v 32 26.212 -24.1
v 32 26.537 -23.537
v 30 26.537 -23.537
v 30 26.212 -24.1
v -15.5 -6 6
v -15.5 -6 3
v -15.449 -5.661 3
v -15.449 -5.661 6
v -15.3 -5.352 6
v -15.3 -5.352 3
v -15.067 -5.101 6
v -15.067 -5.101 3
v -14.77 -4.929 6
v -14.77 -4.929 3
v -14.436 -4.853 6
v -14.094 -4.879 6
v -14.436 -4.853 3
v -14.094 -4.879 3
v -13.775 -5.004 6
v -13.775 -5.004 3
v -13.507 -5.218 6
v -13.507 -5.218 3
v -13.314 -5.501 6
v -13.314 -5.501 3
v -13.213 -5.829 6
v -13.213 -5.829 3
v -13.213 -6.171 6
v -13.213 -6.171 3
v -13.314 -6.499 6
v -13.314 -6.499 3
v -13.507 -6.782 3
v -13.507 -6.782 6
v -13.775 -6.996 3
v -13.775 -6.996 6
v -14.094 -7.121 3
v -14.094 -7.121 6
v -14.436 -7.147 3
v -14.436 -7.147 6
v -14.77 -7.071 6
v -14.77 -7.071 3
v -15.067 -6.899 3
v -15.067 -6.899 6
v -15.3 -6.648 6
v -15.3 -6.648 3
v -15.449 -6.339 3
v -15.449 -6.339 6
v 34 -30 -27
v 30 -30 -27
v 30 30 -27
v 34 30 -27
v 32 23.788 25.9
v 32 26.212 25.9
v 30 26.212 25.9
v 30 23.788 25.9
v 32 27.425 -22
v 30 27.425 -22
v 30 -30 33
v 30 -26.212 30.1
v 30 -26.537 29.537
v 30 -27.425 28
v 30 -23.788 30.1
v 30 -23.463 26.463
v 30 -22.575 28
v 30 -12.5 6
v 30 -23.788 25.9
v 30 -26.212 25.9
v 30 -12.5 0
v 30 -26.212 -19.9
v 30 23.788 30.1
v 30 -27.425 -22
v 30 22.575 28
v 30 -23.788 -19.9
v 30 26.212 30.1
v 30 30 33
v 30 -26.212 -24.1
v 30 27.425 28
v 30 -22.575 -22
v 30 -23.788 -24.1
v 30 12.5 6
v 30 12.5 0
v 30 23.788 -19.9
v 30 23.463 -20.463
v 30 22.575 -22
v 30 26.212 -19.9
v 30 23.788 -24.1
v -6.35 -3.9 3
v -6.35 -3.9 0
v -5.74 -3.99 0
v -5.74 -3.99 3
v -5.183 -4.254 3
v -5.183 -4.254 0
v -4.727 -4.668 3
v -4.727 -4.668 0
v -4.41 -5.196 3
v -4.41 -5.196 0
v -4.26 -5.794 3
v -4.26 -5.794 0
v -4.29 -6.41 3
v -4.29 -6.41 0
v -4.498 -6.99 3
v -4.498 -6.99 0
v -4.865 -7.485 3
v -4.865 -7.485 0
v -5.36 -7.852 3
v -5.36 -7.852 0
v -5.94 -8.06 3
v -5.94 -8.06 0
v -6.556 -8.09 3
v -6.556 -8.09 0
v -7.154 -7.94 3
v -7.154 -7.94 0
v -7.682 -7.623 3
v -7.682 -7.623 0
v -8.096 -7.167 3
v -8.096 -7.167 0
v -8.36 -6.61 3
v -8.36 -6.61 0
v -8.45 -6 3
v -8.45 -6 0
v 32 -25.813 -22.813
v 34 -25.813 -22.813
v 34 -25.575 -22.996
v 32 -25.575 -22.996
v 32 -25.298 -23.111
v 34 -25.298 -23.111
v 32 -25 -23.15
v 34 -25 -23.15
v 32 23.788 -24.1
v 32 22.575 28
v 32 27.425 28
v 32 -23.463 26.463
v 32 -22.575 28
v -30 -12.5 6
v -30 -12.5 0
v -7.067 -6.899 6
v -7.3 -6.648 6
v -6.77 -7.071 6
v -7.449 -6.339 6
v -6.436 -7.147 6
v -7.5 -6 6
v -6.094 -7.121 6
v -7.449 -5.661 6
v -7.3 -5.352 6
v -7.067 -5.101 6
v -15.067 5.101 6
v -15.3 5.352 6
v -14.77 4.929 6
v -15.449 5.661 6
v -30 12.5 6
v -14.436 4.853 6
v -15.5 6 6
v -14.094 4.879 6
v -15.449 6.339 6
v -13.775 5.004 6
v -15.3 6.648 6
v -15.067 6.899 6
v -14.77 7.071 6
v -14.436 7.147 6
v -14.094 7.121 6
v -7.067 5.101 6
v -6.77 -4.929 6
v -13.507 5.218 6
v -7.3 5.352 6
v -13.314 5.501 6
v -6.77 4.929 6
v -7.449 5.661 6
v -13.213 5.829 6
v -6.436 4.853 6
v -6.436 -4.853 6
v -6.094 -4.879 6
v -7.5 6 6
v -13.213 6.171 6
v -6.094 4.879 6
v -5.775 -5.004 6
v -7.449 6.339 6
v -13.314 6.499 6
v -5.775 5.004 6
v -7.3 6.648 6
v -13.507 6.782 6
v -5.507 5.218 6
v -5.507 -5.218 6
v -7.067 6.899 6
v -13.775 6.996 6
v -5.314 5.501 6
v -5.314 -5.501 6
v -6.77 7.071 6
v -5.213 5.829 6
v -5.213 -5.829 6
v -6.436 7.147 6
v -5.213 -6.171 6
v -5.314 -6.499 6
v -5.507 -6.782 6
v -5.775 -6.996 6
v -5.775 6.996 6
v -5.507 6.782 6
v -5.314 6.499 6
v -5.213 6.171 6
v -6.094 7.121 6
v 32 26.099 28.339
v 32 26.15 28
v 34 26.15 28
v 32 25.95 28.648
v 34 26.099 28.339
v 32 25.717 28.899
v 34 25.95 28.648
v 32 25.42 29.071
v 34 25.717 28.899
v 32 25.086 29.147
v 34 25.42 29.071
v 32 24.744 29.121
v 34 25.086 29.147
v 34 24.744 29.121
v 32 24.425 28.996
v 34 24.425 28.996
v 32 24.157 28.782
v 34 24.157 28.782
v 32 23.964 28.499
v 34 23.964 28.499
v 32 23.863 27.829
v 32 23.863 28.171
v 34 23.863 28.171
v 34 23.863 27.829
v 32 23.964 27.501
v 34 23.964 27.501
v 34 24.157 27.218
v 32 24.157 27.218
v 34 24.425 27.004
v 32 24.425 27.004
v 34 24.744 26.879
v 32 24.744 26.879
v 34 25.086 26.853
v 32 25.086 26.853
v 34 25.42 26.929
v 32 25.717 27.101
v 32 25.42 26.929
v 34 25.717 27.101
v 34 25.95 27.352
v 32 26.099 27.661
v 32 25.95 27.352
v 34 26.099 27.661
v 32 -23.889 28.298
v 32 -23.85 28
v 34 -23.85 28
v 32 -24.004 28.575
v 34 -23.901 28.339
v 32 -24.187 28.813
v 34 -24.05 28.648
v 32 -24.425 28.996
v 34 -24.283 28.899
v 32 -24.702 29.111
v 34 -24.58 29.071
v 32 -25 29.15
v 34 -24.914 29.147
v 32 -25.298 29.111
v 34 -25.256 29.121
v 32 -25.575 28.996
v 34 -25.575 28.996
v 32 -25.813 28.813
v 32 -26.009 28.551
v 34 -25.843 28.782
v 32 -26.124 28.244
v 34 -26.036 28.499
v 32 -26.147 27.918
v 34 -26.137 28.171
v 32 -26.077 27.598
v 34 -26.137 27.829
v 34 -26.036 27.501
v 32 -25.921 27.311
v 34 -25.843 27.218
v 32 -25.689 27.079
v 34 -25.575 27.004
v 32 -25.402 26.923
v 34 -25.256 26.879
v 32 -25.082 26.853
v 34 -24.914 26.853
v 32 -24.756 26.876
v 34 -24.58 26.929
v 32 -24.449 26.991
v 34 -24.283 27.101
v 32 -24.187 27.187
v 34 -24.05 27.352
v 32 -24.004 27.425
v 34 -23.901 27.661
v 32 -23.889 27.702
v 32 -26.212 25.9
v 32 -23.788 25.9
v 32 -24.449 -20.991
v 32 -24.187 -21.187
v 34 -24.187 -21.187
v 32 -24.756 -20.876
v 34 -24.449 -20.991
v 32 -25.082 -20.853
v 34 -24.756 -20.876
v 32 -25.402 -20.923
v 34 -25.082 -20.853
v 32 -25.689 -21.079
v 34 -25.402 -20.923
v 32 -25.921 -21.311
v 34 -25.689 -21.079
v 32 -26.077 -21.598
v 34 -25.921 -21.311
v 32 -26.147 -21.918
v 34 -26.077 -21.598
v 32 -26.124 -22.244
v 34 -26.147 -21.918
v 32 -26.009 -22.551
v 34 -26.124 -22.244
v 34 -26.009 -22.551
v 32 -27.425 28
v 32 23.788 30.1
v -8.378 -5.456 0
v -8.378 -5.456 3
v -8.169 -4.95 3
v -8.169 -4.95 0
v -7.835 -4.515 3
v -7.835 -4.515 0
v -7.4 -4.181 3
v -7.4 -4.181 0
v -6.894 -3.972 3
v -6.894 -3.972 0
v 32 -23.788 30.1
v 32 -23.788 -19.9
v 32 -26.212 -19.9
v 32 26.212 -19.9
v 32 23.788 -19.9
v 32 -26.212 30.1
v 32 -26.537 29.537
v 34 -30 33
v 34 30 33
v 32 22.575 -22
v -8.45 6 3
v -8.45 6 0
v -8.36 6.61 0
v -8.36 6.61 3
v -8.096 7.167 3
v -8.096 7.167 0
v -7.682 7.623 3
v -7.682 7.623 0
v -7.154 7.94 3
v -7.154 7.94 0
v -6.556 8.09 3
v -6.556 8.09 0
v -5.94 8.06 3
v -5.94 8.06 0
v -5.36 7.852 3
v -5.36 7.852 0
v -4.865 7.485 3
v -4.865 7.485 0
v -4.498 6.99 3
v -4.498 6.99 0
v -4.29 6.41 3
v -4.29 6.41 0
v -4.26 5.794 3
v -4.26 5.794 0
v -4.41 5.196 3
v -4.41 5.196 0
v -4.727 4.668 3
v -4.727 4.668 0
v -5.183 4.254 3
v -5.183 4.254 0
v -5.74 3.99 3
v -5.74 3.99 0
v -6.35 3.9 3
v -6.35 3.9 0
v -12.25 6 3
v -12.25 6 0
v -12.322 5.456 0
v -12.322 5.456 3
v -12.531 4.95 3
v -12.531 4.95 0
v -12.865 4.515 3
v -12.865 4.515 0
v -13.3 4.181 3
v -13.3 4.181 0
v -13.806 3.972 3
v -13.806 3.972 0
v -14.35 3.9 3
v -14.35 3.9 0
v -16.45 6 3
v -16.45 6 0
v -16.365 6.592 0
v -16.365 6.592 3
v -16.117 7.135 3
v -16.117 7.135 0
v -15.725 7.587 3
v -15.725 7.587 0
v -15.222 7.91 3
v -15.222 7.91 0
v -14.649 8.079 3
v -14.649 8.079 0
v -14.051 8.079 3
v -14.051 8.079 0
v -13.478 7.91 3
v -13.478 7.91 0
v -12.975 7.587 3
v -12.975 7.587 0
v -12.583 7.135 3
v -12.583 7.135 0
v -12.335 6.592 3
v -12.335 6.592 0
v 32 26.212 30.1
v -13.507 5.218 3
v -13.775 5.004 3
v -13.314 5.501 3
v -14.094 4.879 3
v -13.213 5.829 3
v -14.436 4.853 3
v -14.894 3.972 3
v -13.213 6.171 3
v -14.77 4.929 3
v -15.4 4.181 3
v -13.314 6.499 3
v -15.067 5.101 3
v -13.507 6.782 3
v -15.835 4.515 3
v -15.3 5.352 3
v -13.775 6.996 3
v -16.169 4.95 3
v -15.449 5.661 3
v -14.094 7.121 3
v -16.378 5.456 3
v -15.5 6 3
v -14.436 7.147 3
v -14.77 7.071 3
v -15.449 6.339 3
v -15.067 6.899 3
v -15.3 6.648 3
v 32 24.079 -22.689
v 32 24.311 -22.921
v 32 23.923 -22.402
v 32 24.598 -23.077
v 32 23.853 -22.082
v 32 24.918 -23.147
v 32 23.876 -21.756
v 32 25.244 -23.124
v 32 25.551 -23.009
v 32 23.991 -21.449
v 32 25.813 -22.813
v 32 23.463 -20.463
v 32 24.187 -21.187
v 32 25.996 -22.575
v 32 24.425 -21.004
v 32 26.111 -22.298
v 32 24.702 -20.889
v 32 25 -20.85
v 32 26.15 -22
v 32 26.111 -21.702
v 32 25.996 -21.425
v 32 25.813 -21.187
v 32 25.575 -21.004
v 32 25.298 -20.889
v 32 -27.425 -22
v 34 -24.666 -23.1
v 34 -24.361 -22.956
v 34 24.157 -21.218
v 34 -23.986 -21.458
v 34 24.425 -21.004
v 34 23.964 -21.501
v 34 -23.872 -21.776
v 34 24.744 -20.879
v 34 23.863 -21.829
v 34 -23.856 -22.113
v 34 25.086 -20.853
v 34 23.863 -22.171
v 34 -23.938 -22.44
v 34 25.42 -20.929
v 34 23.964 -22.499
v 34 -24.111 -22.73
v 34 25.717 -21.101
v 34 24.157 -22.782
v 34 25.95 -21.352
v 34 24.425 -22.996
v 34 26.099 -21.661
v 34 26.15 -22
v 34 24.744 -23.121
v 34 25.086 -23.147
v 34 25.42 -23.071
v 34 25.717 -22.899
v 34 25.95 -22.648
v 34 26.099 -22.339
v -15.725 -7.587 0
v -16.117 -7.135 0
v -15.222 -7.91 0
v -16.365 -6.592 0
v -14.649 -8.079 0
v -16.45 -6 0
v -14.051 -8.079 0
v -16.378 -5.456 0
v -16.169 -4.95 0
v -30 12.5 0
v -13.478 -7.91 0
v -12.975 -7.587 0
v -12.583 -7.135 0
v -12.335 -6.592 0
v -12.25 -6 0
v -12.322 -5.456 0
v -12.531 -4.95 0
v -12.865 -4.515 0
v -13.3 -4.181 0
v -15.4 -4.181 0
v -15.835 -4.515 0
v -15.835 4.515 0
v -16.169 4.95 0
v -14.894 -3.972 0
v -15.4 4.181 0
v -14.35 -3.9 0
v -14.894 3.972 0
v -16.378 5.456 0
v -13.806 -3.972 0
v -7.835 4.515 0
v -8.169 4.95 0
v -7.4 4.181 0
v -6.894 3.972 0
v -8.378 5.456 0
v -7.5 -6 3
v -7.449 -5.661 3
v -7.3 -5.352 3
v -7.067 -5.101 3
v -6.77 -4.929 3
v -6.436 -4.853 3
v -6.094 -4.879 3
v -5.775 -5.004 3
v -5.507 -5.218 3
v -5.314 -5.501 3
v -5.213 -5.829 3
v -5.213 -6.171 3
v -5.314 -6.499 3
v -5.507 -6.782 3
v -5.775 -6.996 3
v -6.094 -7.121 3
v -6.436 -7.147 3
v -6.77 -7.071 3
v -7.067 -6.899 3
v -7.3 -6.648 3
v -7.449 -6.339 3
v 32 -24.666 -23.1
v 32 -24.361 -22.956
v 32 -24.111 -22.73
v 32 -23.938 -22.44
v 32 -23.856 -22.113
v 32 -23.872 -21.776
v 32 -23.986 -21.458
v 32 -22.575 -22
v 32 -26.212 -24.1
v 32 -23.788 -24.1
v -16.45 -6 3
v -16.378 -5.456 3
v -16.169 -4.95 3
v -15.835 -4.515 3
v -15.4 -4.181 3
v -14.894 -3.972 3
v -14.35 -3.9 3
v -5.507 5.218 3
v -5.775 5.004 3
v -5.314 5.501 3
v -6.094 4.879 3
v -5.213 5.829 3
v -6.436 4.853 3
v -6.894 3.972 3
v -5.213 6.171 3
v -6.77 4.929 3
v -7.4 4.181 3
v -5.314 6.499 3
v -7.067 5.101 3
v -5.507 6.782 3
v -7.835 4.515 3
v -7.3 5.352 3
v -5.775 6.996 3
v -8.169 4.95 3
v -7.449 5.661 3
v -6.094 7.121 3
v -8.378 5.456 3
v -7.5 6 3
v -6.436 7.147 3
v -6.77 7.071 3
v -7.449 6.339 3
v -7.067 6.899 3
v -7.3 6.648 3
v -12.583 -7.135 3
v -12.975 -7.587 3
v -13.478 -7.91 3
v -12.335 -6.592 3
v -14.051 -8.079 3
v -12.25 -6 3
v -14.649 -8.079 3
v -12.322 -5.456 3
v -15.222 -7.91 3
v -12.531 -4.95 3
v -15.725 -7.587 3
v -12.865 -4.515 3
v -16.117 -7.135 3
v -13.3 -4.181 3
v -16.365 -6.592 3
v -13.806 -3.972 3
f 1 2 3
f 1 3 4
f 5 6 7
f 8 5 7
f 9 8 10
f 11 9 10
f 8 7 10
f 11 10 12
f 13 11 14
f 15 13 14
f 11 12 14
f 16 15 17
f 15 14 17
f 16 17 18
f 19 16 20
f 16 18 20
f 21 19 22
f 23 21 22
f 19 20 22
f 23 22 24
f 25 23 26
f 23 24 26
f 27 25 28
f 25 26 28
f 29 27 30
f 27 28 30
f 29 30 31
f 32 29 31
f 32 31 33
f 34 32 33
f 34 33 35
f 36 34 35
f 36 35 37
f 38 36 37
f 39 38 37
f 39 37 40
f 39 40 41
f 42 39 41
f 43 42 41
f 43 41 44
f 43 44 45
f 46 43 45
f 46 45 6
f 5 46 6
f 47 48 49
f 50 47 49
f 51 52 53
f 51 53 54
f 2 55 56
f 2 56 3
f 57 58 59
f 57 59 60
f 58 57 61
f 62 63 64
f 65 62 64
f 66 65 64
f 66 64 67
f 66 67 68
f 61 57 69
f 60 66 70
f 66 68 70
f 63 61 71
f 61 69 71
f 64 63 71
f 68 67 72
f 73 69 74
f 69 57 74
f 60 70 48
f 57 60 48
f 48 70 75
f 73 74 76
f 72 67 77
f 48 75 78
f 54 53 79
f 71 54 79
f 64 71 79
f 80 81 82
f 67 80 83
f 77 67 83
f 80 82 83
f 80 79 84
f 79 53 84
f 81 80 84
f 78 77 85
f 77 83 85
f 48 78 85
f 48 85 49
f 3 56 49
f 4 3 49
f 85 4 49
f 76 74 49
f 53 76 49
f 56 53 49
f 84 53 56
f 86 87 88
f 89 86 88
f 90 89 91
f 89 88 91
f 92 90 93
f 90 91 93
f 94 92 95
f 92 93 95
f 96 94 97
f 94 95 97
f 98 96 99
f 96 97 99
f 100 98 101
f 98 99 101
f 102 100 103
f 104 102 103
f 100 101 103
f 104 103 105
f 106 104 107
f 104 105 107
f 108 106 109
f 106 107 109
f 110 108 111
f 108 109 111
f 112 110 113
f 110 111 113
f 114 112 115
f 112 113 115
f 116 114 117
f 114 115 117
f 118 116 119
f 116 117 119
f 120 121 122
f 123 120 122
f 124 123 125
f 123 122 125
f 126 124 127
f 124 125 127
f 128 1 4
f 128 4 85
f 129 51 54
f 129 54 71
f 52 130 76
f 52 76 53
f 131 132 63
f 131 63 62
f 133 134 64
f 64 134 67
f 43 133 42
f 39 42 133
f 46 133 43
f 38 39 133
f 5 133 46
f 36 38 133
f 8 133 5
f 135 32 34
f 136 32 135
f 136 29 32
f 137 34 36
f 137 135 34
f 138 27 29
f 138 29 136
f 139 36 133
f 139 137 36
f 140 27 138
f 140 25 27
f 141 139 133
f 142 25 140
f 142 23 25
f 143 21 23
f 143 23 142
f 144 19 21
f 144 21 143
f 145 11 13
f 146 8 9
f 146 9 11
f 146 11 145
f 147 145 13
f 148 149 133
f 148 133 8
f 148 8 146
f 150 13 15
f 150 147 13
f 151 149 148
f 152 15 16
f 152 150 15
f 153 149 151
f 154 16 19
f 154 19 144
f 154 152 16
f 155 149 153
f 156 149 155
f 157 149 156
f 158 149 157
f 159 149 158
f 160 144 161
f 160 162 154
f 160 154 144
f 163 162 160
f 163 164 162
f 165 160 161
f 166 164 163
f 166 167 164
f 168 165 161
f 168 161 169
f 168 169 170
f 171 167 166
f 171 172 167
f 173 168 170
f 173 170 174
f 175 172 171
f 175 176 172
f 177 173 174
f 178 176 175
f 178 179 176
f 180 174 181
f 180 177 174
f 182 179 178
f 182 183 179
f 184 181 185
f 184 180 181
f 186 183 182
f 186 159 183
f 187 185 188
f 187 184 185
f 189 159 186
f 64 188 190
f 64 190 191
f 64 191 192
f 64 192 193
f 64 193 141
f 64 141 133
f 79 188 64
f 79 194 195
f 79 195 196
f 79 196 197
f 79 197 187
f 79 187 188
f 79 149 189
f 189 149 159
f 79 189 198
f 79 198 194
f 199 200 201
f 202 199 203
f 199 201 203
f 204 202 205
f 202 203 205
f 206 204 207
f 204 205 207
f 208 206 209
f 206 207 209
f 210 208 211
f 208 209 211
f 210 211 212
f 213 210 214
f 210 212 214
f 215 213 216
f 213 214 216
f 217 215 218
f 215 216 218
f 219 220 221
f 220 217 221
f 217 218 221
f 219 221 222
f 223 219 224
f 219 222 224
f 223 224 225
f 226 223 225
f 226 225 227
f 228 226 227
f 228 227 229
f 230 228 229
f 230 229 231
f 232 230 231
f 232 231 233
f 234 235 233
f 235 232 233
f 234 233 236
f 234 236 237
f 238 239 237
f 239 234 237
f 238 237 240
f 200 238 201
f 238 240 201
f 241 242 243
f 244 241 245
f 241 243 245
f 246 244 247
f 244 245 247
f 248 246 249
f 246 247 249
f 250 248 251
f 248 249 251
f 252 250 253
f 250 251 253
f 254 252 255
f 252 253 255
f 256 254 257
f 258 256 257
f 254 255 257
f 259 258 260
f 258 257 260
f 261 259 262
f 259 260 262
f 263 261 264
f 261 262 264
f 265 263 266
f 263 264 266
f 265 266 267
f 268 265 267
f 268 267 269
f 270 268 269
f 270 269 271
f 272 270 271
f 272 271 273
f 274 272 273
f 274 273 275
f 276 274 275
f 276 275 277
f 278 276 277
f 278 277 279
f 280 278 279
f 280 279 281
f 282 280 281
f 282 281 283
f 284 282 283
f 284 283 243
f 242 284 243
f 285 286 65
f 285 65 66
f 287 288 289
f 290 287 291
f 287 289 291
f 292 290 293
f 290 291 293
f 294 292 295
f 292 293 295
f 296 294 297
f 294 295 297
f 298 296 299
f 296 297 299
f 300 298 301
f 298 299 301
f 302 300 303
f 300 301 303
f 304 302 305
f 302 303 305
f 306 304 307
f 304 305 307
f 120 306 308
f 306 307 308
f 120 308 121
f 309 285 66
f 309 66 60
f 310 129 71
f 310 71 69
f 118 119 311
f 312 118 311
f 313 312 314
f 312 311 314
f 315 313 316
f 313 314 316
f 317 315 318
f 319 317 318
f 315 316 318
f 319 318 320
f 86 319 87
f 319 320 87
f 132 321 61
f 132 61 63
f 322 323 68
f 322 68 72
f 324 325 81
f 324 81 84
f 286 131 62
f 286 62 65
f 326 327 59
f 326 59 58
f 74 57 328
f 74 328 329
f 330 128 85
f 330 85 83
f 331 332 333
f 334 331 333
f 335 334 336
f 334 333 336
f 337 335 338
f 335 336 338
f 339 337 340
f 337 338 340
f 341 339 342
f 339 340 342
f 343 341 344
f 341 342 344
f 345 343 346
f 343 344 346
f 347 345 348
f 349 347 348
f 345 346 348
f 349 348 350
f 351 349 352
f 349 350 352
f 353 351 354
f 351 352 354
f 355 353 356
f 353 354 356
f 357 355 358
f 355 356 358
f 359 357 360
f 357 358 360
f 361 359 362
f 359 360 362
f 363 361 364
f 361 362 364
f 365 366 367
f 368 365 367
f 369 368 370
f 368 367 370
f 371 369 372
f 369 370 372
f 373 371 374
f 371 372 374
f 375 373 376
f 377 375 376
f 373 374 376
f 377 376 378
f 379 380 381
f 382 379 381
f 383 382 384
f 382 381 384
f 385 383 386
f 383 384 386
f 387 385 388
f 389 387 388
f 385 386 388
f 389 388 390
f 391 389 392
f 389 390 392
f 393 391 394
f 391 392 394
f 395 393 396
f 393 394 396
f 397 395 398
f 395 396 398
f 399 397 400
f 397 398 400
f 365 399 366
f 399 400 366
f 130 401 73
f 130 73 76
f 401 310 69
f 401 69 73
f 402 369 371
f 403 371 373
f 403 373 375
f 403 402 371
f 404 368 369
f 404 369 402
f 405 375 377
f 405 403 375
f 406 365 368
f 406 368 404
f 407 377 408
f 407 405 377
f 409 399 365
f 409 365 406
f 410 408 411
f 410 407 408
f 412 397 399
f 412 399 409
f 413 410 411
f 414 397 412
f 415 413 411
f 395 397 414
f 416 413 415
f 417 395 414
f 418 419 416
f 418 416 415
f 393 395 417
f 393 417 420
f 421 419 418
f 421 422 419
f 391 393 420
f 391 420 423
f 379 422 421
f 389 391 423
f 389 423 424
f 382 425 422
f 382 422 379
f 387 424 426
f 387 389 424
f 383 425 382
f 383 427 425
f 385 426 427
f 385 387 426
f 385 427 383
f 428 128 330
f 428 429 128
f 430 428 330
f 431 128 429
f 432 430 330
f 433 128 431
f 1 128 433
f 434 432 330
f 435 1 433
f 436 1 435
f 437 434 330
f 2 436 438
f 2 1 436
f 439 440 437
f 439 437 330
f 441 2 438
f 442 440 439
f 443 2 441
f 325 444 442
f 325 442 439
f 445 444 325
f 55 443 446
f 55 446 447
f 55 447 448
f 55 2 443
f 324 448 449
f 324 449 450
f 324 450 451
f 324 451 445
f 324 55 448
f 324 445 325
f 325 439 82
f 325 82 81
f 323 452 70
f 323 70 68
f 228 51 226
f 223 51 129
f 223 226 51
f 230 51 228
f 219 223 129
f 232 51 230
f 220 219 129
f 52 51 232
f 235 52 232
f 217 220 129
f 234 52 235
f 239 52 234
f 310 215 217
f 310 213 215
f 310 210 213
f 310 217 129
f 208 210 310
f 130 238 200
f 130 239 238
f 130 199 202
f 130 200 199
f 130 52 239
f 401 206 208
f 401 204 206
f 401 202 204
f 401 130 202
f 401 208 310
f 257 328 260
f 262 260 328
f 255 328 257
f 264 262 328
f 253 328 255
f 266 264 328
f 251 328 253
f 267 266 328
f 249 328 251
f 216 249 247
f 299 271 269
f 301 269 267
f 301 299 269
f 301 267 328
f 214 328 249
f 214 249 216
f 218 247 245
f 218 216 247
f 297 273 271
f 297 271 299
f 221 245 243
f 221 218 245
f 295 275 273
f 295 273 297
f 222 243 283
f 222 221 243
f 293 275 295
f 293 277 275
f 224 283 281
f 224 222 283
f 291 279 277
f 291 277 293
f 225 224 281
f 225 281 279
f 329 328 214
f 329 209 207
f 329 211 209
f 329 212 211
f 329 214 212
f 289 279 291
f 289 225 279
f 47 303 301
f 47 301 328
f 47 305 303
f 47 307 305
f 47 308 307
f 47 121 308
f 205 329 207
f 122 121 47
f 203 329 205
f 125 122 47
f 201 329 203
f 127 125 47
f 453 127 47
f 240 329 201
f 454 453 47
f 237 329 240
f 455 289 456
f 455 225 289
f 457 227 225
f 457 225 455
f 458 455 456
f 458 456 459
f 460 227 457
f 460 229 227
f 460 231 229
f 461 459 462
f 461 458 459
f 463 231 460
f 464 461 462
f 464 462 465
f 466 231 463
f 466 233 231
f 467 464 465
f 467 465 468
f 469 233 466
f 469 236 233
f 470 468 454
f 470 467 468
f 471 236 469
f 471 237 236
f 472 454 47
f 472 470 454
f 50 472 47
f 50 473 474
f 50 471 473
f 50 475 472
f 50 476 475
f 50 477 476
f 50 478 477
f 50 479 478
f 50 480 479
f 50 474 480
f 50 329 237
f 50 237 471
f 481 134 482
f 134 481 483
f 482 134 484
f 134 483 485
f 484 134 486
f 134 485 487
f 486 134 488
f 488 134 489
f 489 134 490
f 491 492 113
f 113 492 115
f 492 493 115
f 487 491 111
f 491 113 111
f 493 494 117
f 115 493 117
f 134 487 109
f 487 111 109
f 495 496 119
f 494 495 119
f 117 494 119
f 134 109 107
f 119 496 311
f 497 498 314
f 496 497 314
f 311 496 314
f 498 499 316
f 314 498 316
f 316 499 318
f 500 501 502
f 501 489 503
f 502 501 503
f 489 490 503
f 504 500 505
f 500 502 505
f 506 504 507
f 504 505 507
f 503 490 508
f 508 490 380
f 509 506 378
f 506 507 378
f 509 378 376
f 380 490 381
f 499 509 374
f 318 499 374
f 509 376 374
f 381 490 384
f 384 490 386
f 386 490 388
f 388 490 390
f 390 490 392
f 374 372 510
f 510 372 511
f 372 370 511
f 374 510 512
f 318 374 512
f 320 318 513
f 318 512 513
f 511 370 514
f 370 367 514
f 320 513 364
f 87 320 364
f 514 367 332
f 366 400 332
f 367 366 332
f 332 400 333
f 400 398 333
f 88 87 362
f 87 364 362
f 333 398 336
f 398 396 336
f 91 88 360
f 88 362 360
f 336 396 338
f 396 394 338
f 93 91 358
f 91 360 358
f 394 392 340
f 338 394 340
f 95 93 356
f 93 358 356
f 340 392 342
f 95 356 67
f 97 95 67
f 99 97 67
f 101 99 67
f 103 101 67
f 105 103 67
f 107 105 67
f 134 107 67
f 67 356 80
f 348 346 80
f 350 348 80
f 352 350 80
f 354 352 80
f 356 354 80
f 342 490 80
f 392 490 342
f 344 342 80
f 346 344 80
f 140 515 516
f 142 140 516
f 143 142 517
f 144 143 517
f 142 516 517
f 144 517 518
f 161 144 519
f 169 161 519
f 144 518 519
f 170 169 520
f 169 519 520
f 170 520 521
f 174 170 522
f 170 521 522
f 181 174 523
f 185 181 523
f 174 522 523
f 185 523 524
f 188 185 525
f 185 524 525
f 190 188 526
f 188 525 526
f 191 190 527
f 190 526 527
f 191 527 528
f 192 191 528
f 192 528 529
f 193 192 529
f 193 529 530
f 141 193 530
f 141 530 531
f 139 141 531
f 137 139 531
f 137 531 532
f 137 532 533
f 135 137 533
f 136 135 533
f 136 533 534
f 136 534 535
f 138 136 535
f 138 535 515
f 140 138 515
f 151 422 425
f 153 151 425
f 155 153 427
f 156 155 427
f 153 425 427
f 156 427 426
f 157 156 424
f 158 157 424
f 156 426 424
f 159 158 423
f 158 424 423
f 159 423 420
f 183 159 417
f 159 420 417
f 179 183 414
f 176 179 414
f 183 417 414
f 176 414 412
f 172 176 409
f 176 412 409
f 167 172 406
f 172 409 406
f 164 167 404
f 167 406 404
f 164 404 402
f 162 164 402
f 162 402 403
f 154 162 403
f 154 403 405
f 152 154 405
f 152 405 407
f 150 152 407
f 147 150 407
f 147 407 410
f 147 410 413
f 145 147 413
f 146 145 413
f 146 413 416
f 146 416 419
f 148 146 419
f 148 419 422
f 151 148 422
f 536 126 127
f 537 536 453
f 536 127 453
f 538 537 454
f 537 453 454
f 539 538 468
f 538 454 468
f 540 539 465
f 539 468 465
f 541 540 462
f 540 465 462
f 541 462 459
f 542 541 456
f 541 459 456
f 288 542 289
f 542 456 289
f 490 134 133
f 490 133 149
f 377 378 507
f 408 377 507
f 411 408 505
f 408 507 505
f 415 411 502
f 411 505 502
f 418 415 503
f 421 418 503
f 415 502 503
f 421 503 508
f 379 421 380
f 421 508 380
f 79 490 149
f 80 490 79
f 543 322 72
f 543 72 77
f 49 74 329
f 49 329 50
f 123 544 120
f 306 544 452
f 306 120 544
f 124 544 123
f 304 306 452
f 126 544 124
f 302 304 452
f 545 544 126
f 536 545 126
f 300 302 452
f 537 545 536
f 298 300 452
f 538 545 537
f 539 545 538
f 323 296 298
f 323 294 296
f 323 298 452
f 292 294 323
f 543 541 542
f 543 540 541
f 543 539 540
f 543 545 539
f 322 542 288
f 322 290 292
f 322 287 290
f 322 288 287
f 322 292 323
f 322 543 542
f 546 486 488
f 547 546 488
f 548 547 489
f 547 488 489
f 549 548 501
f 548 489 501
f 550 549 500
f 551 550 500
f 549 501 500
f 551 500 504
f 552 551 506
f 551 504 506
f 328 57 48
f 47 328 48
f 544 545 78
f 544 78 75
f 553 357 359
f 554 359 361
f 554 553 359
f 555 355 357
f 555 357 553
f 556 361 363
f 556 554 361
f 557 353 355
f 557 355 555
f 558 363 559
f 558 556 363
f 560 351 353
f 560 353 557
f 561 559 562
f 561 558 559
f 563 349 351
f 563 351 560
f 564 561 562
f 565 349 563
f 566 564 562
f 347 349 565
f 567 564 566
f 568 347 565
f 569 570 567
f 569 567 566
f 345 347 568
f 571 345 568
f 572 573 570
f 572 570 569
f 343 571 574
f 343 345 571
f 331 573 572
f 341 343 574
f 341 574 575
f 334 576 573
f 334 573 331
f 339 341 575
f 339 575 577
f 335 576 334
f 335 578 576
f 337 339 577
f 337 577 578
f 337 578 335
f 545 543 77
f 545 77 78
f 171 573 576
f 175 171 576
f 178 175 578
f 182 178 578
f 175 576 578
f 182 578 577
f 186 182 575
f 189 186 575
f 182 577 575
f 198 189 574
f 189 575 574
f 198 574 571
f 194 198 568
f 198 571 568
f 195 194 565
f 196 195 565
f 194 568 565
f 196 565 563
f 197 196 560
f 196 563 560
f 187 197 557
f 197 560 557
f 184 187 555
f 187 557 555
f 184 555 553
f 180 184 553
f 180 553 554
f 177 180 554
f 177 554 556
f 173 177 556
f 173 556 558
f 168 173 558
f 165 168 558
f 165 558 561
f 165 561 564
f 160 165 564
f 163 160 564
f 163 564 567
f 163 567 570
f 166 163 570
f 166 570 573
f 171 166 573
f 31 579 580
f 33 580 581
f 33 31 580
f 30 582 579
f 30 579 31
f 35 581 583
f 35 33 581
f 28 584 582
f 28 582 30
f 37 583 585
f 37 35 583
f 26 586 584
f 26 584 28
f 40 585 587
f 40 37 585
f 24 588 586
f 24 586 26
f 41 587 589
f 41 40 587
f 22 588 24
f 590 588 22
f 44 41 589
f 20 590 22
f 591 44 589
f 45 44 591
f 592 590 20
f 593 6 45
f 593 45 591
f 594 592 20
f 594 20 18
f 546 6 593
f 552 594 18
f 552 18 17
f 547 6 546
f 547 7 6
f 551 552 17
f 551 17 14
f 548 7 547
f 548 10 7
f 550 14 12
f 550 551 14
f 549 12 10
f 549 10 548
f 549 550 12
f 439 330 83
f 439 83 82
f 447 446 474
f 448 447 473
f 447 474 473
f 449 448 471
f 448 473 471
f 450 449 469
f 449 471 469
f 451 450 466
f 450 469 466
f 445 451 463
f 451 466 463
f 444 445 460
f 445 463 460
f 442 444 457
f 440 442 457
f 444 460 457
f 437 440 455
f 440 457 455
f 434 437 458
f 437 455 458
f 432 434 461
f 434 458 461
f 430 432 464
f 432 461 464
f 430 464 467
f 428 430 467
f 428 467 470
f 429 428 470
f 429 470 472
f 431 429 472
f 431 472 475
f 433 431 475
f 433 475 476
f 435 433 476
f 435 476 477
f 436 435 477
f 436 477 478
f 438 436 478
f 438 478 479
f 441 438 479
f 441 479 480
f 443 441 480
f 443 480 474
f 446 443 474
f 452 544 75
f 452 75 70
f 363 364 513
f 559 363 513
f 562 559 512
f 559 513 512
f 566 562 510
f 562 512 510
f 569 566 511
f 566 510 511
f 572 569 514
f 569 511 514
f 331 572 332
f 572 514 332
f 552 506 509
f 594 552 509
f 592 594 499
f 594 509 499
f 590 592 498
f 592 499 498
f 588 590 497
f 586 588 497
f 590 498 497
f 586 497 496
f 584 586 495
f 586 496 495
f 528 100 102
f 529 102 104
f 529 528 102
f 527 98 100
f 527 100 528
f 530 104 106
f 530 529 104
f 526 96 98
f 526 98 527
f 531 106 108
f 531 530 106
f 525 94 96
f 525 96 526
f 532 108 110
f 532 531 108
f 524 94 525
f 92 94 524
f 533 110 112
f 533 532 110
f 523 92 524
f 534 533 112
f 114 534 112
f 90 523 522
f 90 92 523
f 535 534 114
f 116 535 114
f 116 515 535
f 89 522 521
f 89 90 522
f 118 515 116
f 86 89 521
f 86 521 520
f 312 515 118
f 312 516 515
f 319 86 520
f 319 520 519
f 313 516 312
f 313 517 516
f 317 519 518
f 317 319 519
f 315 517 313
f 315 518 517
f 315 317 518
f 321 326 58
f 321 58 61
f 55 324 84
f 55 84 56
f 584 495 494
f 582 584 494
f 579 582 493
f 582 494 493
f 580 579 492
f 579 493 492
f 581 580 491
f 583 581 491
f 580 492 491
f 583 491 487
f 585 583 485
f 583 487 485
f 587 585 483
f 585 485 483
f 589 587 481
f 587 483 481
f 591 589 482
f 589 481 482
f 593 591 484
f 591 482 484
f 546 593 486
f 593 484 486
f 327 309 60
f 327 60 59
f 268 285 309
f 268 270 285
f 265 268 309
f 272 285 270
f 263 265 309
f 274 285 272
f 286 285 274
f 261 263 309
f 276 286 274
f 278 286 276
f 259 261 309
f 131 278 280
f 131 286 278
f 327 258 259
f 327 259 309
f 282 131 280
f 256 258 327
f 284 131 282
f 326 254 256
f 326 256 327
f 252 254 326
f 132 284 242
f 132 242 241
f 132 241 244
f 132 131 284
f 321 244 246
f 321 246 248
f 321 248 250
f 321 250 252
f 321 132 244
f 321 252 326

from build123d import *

# Parameters (mm, degrees)
SKETCH1_W           = 60
SKETCH1_H           = 25
BOSS_EXTRUDE1_DEPTH = 6
CUT_EXTRUDE3_DEPTH  = 3
SKETCH5_R           = 1.15
CUT_EXTRUDE4_DEPTH  = 33.638167841
SKETCH7_W           = 60
SKETCH7_H           = 60
BOSS_EXTRUDE2_DEPTH = 4
SKETCH8_R           = 1.15
CUT_EXTRUDE5_DEPTH  = 10
CUT_EXTRUDE6_START  = -2
SKETCH9_R           = 1.15
CUT_EXTRUDE6_DEPTH  = 2


with BuildPart() as part:
    # Sketch1 → Boss-Extrude1 (new body)
    with BuildSketch(Plane.XY):
        Rectangle(SKETCH1_W, SKETCH1_H)
    extrude(amount=BOSS_EXTRUDE1_DEPTH)

    # Sketch4 → Cut-Extrude3 (cut)
    with BuildSketch(Plane(origin=(0, 0, 0), x_dir=(-1, 0, 0), z_dir=(0, 0, -1))):
        with BuildLine():
            ThreePointArc((8.45, 6), (4.86507576, 7.48492424), (6.35, 3.9))
            Line((6.35, 3.9), (6.35, 6))
            Line((6.35, 6), (8.45, 6))
        make_face()
        with BuildLine():
            Line((6.35, 6), (6.35, 3.9))
            ThreePointArc((6.35, 3.9), (7.83492424, 4.51507576), (8.45, 6))
            Line((8.45, 6), (6.35, 6))
        make_face()
        with BuildLine():
            ThreePointArc((12.25, 6), (12.86507576, 4.51507576), (14.35, 3.9))
            Line((14.35, 3.9), (14.35, 6))
            Line((14.35, 6), (12.25, 6))
        make_face()
        with BuildLine():
            Line((14.35, 6), (14.35, 3.9))
            ThreePointArc((14.35, 3.9), (15.83492424, 4.51507576), (16.45, 6))
            ThreePointArc((16.45, 6), (14.35, 8.1), (12.25, 6))
            Line((12.25, 6), (14.35, 6))
        make_face()
        with BuildLine():
            ThreePointArc((14.35, -3.9), (12.86507576, -4.51507576), (12.25, -6))
            Line((12.25, -6), (14.35, -6))
            Line((14.35, -6), (14.35, -3.9))
        make_face()
        with BuildLine():
            Line((14.35, -6), (12.25, -6))
            ThreePointArc((12.25, -6), (14.35, -8.1), (16.45, -6))
            ThreePointArc((16.45, -6), (15.83492424, -4.51507576), (14.35, -3.9))
            Line((14.35, -3.9), (14.35, -6))
        make_face()
        with BuildLine():
            Line((6.35, -3.9), (6.35, -6))
            Line((6.35, -6), (8.45, -6))
            ThreePointArc((8.45, -6), (7.83492424, -4.51507576), (6.35, -3.9))
        make_face()
        with BuildLine():
            Line((8.45, -6), (6.35, -6))
            Line((6.35, -6), (6.35, -3.9))
            ThreePointArc((6.35, -3.9), (4.86507576, -7.48492424), (8.45, -6))
        make_face()
    extrude(amount=-CUT_EXTRUDE3_DEPTH, mode=Mode.SUBTRACT)

    # Sketch5 → Cut-Extrude4 (cut, through all)
    with BuildSketch(Plane(origin=(0, 0, 3), x_dir=(-1, 0, 0), z_dir=(0, 0, -1))):
        with Locations((6.35, 6)):
            Circle(SKETCH5_R)
        with Locations((14.35, 6)):
            Circle(SKETCH5_R)
        with Locations((14.35, -6)):
            Circle(SKETCH5_R)
        with Locations((6.35, -6)):
            Circle(SKETCH5_R)
    extrude(amount=-CUT_EXTRUDE4_DEPTH, mode=Mode.SUBTRACT)

    # Sketch7 → Boss-Extrude2 (add)
    with BuildSketch(Plane(origin=(30, 0, 0), x_dir=(0, 0, -1), z_dir=(1, 0, 0))):
        with Locations((-3, 0)):
            Rectangle(SKETCH7_W, SKETCH7_H)
    extrude(amount=BOSS_EXTRUDE2_DEPTH)

    # Sketch8 → Cut-Extrude5 (cut)
    with BuildSketch(Plane(origin=(34, 0, 0), x_dir=(0, 0, -1), z_dir=(1, 0, 0))):
        with Locations(Location((-28, -25, 0), (0, 0, 90))):
            Circle(SKETCH8_R)
        with Locations(Location((-28, 25, 0), (0, 0, 90))):
            Circle(SKETCH8_R)
        with BuildLine():
            ThreePointArc((23.15, -25), (22.440085947, -23.937538538), (21.186827202, -24.186827202))
            Line((21.186827202, -24.186827202), (22.813172798, -25.813172798))
            ThreePointArc((22.813172798, -25.813172798), (23.062461462, -25.440085947), (23.15, -25))
        make_face()
        with BuildLine():
            Line((22.813172798, -25.813172798), (21.186827202, -24.186827202))
            ThreePointArc((21.186827202, -24.186827202), (21.186827202, -25.813172798), (22.813172798, -25.813172798))
        make_face()
        with Locations(Location((22, 25, 0), (0, 0, 90))):
            Circle(SKETCH8_R)
    extrude(amount=-CUT_EXTRUDE5_DEPTH, mode=Mode.SUBTRACT)

    # Sketch9 → Cut-Extrude6 (cut)
    # profile 1 of 6: a face of its own
    with BuildSketch(Plane.ZY.offset(-30).offset(CUT_EXTRUDE6_START)):
        Polygon((25.9, 26.212435565), (25.9, 23.787564435), (28, 22.575128869), (30.1, 23.787564435), (30.1, 26.212435565), (28, 27.424871131), align=None)
        with Locations(Location((28, 25, 0), (0, 0, 90))):
            Circle(SKETCH9_R, mode=Mode.SUBTRACT)
    # profile 2 of 6: a face of its own
    with BuildSketch(Plane.ZY.offset(-30).offset(CUT_EXTRUDE6_START)):
        with BuildLine():
            Line((28.813172798, -25.813172798), (29.537306696, -26.537306696))
            Line((29.537306696, -26.537306696), (30.1, -26.212435565))
            Line((30.1, -26.212435565), (30.1, -23.787564435))
            Line((30.1, -23.787564435), (28, -22.575128869))
            Line((28, -22.575128869), (26.462693304, -23.462693304))
            Line((26.462693304, -23.462693304), (27.186827202, -24.186827202))
            ThreePointArc((27.186827202, -24.186827202), (28.440085947, -23.937538538), (29.15, -25))
            ThreePointArc((29.15, -25), (29.062461462, -25.440085947), (28.813172798, -25.813172798))
        make_face()
    # profile 3 of 6: a face of its own
    with BuildSketch(Plane.ZY.offset(-30).offset(CUT_EXTRUDE6_START)):
        with BuildLine():
            Line((28, -27.424871131), (29.537306696, -26.537306696))
            Line((29.537306696, -26.537306696), (28.813172798, -25.813172798))
            ThreePointArc((28.813172798, -25.813172798), (27.186827202, -25.813172798), (27.186827202, -24.186827202))
            Line((27.186827202, -24.186827202), (26.462693304, -23.462693304))
            Line((26.462693304, -23.462693304), (25.9, -23.787564435))
            Line((25.9, -23.787564435), (25.9, -26.212435565))
            Line((25.9, -26.212435565), (28, -27.424871131))
        make_face()
    # profile 4 of 6: a face of its own
    with BuildSketch(Plane.ZY.offset(-30).offset(CUT_EXTRUDE6_START)):
        Polygon((-22, -22.575128869), (-24.1, -23.787564435), (-24.1, -26.212435565), (-22, -27.424871131), (-19.9, -26.212435565), (-19.9, -23.787564435), align=None)
        with Locations(Location((-22, -25, 0), (0, 0, 90))):
            Circle(SKETCH9_R, mode=Mode.SUBTRACT)
    # profile 5 of 6: a face of its own
    with BuildSketch(Plane.ZY.offset(-30).offset(CUT_EXTRUDE6_START)):
        with BuildLine():
            Line((-21.186827202, 24.186827202), (-20.462693304, 23.462693304))
            Line((-20.462693304, 23.462693304), (-19.9, 23.787564435))
            Line((-19.9, 23.787564435), (-19.9, 26.212435565))
            Line((-19.9, 26.212435565), (-22, 27.424871131))
            Line((-22, 27.424871131), (-23.537306696, 26.537306696))
            Line((-23.537306696, 26.537306696), (-22.813172798, 25.813172798))
            ThreePointArc((-22.813172798, 25.813172798), (-21.559914053, 26.062461462), (-20.85, 25))
            ThreePointArc((-20.85, 25), (-20.937538538, 24.559914053), (-21.186827202, 24.186827202))
        make_face()
    # profile 6 of 6: a face of its own
    with BuildSketch(Plane.ZY.offset(-30).offset(CUT_EXTRUDE6_START)):
        with BuildLine():
            Line((-22, 22.575128869), (-20.462693304, 23.462693304))
            Line((-20.462693304, 23.462693304), (-21.186827202, 24.186827202))
            ThreePointArc((-21.186827202, 24.186827202), (-22.813172798, 24.186827202), (-22.813172798, 25.813172798))
            Line((-22.813172798, 25.813172798), (-23.537306696, 26.537306696))
            Line((-23.537306696, 26.537306696), (-24.1, 26.212435565))
            Line((-24.1, 26.212435565), (-24.1, 23.787564435))
            Line((-24.1, 23.787564435), (-22, 22.575128869))
        make_face()
    extrude(amount=CUT_EXTRUDE6_DEPTH, mode=Mode.SUBTRACT)


solid = part.part
